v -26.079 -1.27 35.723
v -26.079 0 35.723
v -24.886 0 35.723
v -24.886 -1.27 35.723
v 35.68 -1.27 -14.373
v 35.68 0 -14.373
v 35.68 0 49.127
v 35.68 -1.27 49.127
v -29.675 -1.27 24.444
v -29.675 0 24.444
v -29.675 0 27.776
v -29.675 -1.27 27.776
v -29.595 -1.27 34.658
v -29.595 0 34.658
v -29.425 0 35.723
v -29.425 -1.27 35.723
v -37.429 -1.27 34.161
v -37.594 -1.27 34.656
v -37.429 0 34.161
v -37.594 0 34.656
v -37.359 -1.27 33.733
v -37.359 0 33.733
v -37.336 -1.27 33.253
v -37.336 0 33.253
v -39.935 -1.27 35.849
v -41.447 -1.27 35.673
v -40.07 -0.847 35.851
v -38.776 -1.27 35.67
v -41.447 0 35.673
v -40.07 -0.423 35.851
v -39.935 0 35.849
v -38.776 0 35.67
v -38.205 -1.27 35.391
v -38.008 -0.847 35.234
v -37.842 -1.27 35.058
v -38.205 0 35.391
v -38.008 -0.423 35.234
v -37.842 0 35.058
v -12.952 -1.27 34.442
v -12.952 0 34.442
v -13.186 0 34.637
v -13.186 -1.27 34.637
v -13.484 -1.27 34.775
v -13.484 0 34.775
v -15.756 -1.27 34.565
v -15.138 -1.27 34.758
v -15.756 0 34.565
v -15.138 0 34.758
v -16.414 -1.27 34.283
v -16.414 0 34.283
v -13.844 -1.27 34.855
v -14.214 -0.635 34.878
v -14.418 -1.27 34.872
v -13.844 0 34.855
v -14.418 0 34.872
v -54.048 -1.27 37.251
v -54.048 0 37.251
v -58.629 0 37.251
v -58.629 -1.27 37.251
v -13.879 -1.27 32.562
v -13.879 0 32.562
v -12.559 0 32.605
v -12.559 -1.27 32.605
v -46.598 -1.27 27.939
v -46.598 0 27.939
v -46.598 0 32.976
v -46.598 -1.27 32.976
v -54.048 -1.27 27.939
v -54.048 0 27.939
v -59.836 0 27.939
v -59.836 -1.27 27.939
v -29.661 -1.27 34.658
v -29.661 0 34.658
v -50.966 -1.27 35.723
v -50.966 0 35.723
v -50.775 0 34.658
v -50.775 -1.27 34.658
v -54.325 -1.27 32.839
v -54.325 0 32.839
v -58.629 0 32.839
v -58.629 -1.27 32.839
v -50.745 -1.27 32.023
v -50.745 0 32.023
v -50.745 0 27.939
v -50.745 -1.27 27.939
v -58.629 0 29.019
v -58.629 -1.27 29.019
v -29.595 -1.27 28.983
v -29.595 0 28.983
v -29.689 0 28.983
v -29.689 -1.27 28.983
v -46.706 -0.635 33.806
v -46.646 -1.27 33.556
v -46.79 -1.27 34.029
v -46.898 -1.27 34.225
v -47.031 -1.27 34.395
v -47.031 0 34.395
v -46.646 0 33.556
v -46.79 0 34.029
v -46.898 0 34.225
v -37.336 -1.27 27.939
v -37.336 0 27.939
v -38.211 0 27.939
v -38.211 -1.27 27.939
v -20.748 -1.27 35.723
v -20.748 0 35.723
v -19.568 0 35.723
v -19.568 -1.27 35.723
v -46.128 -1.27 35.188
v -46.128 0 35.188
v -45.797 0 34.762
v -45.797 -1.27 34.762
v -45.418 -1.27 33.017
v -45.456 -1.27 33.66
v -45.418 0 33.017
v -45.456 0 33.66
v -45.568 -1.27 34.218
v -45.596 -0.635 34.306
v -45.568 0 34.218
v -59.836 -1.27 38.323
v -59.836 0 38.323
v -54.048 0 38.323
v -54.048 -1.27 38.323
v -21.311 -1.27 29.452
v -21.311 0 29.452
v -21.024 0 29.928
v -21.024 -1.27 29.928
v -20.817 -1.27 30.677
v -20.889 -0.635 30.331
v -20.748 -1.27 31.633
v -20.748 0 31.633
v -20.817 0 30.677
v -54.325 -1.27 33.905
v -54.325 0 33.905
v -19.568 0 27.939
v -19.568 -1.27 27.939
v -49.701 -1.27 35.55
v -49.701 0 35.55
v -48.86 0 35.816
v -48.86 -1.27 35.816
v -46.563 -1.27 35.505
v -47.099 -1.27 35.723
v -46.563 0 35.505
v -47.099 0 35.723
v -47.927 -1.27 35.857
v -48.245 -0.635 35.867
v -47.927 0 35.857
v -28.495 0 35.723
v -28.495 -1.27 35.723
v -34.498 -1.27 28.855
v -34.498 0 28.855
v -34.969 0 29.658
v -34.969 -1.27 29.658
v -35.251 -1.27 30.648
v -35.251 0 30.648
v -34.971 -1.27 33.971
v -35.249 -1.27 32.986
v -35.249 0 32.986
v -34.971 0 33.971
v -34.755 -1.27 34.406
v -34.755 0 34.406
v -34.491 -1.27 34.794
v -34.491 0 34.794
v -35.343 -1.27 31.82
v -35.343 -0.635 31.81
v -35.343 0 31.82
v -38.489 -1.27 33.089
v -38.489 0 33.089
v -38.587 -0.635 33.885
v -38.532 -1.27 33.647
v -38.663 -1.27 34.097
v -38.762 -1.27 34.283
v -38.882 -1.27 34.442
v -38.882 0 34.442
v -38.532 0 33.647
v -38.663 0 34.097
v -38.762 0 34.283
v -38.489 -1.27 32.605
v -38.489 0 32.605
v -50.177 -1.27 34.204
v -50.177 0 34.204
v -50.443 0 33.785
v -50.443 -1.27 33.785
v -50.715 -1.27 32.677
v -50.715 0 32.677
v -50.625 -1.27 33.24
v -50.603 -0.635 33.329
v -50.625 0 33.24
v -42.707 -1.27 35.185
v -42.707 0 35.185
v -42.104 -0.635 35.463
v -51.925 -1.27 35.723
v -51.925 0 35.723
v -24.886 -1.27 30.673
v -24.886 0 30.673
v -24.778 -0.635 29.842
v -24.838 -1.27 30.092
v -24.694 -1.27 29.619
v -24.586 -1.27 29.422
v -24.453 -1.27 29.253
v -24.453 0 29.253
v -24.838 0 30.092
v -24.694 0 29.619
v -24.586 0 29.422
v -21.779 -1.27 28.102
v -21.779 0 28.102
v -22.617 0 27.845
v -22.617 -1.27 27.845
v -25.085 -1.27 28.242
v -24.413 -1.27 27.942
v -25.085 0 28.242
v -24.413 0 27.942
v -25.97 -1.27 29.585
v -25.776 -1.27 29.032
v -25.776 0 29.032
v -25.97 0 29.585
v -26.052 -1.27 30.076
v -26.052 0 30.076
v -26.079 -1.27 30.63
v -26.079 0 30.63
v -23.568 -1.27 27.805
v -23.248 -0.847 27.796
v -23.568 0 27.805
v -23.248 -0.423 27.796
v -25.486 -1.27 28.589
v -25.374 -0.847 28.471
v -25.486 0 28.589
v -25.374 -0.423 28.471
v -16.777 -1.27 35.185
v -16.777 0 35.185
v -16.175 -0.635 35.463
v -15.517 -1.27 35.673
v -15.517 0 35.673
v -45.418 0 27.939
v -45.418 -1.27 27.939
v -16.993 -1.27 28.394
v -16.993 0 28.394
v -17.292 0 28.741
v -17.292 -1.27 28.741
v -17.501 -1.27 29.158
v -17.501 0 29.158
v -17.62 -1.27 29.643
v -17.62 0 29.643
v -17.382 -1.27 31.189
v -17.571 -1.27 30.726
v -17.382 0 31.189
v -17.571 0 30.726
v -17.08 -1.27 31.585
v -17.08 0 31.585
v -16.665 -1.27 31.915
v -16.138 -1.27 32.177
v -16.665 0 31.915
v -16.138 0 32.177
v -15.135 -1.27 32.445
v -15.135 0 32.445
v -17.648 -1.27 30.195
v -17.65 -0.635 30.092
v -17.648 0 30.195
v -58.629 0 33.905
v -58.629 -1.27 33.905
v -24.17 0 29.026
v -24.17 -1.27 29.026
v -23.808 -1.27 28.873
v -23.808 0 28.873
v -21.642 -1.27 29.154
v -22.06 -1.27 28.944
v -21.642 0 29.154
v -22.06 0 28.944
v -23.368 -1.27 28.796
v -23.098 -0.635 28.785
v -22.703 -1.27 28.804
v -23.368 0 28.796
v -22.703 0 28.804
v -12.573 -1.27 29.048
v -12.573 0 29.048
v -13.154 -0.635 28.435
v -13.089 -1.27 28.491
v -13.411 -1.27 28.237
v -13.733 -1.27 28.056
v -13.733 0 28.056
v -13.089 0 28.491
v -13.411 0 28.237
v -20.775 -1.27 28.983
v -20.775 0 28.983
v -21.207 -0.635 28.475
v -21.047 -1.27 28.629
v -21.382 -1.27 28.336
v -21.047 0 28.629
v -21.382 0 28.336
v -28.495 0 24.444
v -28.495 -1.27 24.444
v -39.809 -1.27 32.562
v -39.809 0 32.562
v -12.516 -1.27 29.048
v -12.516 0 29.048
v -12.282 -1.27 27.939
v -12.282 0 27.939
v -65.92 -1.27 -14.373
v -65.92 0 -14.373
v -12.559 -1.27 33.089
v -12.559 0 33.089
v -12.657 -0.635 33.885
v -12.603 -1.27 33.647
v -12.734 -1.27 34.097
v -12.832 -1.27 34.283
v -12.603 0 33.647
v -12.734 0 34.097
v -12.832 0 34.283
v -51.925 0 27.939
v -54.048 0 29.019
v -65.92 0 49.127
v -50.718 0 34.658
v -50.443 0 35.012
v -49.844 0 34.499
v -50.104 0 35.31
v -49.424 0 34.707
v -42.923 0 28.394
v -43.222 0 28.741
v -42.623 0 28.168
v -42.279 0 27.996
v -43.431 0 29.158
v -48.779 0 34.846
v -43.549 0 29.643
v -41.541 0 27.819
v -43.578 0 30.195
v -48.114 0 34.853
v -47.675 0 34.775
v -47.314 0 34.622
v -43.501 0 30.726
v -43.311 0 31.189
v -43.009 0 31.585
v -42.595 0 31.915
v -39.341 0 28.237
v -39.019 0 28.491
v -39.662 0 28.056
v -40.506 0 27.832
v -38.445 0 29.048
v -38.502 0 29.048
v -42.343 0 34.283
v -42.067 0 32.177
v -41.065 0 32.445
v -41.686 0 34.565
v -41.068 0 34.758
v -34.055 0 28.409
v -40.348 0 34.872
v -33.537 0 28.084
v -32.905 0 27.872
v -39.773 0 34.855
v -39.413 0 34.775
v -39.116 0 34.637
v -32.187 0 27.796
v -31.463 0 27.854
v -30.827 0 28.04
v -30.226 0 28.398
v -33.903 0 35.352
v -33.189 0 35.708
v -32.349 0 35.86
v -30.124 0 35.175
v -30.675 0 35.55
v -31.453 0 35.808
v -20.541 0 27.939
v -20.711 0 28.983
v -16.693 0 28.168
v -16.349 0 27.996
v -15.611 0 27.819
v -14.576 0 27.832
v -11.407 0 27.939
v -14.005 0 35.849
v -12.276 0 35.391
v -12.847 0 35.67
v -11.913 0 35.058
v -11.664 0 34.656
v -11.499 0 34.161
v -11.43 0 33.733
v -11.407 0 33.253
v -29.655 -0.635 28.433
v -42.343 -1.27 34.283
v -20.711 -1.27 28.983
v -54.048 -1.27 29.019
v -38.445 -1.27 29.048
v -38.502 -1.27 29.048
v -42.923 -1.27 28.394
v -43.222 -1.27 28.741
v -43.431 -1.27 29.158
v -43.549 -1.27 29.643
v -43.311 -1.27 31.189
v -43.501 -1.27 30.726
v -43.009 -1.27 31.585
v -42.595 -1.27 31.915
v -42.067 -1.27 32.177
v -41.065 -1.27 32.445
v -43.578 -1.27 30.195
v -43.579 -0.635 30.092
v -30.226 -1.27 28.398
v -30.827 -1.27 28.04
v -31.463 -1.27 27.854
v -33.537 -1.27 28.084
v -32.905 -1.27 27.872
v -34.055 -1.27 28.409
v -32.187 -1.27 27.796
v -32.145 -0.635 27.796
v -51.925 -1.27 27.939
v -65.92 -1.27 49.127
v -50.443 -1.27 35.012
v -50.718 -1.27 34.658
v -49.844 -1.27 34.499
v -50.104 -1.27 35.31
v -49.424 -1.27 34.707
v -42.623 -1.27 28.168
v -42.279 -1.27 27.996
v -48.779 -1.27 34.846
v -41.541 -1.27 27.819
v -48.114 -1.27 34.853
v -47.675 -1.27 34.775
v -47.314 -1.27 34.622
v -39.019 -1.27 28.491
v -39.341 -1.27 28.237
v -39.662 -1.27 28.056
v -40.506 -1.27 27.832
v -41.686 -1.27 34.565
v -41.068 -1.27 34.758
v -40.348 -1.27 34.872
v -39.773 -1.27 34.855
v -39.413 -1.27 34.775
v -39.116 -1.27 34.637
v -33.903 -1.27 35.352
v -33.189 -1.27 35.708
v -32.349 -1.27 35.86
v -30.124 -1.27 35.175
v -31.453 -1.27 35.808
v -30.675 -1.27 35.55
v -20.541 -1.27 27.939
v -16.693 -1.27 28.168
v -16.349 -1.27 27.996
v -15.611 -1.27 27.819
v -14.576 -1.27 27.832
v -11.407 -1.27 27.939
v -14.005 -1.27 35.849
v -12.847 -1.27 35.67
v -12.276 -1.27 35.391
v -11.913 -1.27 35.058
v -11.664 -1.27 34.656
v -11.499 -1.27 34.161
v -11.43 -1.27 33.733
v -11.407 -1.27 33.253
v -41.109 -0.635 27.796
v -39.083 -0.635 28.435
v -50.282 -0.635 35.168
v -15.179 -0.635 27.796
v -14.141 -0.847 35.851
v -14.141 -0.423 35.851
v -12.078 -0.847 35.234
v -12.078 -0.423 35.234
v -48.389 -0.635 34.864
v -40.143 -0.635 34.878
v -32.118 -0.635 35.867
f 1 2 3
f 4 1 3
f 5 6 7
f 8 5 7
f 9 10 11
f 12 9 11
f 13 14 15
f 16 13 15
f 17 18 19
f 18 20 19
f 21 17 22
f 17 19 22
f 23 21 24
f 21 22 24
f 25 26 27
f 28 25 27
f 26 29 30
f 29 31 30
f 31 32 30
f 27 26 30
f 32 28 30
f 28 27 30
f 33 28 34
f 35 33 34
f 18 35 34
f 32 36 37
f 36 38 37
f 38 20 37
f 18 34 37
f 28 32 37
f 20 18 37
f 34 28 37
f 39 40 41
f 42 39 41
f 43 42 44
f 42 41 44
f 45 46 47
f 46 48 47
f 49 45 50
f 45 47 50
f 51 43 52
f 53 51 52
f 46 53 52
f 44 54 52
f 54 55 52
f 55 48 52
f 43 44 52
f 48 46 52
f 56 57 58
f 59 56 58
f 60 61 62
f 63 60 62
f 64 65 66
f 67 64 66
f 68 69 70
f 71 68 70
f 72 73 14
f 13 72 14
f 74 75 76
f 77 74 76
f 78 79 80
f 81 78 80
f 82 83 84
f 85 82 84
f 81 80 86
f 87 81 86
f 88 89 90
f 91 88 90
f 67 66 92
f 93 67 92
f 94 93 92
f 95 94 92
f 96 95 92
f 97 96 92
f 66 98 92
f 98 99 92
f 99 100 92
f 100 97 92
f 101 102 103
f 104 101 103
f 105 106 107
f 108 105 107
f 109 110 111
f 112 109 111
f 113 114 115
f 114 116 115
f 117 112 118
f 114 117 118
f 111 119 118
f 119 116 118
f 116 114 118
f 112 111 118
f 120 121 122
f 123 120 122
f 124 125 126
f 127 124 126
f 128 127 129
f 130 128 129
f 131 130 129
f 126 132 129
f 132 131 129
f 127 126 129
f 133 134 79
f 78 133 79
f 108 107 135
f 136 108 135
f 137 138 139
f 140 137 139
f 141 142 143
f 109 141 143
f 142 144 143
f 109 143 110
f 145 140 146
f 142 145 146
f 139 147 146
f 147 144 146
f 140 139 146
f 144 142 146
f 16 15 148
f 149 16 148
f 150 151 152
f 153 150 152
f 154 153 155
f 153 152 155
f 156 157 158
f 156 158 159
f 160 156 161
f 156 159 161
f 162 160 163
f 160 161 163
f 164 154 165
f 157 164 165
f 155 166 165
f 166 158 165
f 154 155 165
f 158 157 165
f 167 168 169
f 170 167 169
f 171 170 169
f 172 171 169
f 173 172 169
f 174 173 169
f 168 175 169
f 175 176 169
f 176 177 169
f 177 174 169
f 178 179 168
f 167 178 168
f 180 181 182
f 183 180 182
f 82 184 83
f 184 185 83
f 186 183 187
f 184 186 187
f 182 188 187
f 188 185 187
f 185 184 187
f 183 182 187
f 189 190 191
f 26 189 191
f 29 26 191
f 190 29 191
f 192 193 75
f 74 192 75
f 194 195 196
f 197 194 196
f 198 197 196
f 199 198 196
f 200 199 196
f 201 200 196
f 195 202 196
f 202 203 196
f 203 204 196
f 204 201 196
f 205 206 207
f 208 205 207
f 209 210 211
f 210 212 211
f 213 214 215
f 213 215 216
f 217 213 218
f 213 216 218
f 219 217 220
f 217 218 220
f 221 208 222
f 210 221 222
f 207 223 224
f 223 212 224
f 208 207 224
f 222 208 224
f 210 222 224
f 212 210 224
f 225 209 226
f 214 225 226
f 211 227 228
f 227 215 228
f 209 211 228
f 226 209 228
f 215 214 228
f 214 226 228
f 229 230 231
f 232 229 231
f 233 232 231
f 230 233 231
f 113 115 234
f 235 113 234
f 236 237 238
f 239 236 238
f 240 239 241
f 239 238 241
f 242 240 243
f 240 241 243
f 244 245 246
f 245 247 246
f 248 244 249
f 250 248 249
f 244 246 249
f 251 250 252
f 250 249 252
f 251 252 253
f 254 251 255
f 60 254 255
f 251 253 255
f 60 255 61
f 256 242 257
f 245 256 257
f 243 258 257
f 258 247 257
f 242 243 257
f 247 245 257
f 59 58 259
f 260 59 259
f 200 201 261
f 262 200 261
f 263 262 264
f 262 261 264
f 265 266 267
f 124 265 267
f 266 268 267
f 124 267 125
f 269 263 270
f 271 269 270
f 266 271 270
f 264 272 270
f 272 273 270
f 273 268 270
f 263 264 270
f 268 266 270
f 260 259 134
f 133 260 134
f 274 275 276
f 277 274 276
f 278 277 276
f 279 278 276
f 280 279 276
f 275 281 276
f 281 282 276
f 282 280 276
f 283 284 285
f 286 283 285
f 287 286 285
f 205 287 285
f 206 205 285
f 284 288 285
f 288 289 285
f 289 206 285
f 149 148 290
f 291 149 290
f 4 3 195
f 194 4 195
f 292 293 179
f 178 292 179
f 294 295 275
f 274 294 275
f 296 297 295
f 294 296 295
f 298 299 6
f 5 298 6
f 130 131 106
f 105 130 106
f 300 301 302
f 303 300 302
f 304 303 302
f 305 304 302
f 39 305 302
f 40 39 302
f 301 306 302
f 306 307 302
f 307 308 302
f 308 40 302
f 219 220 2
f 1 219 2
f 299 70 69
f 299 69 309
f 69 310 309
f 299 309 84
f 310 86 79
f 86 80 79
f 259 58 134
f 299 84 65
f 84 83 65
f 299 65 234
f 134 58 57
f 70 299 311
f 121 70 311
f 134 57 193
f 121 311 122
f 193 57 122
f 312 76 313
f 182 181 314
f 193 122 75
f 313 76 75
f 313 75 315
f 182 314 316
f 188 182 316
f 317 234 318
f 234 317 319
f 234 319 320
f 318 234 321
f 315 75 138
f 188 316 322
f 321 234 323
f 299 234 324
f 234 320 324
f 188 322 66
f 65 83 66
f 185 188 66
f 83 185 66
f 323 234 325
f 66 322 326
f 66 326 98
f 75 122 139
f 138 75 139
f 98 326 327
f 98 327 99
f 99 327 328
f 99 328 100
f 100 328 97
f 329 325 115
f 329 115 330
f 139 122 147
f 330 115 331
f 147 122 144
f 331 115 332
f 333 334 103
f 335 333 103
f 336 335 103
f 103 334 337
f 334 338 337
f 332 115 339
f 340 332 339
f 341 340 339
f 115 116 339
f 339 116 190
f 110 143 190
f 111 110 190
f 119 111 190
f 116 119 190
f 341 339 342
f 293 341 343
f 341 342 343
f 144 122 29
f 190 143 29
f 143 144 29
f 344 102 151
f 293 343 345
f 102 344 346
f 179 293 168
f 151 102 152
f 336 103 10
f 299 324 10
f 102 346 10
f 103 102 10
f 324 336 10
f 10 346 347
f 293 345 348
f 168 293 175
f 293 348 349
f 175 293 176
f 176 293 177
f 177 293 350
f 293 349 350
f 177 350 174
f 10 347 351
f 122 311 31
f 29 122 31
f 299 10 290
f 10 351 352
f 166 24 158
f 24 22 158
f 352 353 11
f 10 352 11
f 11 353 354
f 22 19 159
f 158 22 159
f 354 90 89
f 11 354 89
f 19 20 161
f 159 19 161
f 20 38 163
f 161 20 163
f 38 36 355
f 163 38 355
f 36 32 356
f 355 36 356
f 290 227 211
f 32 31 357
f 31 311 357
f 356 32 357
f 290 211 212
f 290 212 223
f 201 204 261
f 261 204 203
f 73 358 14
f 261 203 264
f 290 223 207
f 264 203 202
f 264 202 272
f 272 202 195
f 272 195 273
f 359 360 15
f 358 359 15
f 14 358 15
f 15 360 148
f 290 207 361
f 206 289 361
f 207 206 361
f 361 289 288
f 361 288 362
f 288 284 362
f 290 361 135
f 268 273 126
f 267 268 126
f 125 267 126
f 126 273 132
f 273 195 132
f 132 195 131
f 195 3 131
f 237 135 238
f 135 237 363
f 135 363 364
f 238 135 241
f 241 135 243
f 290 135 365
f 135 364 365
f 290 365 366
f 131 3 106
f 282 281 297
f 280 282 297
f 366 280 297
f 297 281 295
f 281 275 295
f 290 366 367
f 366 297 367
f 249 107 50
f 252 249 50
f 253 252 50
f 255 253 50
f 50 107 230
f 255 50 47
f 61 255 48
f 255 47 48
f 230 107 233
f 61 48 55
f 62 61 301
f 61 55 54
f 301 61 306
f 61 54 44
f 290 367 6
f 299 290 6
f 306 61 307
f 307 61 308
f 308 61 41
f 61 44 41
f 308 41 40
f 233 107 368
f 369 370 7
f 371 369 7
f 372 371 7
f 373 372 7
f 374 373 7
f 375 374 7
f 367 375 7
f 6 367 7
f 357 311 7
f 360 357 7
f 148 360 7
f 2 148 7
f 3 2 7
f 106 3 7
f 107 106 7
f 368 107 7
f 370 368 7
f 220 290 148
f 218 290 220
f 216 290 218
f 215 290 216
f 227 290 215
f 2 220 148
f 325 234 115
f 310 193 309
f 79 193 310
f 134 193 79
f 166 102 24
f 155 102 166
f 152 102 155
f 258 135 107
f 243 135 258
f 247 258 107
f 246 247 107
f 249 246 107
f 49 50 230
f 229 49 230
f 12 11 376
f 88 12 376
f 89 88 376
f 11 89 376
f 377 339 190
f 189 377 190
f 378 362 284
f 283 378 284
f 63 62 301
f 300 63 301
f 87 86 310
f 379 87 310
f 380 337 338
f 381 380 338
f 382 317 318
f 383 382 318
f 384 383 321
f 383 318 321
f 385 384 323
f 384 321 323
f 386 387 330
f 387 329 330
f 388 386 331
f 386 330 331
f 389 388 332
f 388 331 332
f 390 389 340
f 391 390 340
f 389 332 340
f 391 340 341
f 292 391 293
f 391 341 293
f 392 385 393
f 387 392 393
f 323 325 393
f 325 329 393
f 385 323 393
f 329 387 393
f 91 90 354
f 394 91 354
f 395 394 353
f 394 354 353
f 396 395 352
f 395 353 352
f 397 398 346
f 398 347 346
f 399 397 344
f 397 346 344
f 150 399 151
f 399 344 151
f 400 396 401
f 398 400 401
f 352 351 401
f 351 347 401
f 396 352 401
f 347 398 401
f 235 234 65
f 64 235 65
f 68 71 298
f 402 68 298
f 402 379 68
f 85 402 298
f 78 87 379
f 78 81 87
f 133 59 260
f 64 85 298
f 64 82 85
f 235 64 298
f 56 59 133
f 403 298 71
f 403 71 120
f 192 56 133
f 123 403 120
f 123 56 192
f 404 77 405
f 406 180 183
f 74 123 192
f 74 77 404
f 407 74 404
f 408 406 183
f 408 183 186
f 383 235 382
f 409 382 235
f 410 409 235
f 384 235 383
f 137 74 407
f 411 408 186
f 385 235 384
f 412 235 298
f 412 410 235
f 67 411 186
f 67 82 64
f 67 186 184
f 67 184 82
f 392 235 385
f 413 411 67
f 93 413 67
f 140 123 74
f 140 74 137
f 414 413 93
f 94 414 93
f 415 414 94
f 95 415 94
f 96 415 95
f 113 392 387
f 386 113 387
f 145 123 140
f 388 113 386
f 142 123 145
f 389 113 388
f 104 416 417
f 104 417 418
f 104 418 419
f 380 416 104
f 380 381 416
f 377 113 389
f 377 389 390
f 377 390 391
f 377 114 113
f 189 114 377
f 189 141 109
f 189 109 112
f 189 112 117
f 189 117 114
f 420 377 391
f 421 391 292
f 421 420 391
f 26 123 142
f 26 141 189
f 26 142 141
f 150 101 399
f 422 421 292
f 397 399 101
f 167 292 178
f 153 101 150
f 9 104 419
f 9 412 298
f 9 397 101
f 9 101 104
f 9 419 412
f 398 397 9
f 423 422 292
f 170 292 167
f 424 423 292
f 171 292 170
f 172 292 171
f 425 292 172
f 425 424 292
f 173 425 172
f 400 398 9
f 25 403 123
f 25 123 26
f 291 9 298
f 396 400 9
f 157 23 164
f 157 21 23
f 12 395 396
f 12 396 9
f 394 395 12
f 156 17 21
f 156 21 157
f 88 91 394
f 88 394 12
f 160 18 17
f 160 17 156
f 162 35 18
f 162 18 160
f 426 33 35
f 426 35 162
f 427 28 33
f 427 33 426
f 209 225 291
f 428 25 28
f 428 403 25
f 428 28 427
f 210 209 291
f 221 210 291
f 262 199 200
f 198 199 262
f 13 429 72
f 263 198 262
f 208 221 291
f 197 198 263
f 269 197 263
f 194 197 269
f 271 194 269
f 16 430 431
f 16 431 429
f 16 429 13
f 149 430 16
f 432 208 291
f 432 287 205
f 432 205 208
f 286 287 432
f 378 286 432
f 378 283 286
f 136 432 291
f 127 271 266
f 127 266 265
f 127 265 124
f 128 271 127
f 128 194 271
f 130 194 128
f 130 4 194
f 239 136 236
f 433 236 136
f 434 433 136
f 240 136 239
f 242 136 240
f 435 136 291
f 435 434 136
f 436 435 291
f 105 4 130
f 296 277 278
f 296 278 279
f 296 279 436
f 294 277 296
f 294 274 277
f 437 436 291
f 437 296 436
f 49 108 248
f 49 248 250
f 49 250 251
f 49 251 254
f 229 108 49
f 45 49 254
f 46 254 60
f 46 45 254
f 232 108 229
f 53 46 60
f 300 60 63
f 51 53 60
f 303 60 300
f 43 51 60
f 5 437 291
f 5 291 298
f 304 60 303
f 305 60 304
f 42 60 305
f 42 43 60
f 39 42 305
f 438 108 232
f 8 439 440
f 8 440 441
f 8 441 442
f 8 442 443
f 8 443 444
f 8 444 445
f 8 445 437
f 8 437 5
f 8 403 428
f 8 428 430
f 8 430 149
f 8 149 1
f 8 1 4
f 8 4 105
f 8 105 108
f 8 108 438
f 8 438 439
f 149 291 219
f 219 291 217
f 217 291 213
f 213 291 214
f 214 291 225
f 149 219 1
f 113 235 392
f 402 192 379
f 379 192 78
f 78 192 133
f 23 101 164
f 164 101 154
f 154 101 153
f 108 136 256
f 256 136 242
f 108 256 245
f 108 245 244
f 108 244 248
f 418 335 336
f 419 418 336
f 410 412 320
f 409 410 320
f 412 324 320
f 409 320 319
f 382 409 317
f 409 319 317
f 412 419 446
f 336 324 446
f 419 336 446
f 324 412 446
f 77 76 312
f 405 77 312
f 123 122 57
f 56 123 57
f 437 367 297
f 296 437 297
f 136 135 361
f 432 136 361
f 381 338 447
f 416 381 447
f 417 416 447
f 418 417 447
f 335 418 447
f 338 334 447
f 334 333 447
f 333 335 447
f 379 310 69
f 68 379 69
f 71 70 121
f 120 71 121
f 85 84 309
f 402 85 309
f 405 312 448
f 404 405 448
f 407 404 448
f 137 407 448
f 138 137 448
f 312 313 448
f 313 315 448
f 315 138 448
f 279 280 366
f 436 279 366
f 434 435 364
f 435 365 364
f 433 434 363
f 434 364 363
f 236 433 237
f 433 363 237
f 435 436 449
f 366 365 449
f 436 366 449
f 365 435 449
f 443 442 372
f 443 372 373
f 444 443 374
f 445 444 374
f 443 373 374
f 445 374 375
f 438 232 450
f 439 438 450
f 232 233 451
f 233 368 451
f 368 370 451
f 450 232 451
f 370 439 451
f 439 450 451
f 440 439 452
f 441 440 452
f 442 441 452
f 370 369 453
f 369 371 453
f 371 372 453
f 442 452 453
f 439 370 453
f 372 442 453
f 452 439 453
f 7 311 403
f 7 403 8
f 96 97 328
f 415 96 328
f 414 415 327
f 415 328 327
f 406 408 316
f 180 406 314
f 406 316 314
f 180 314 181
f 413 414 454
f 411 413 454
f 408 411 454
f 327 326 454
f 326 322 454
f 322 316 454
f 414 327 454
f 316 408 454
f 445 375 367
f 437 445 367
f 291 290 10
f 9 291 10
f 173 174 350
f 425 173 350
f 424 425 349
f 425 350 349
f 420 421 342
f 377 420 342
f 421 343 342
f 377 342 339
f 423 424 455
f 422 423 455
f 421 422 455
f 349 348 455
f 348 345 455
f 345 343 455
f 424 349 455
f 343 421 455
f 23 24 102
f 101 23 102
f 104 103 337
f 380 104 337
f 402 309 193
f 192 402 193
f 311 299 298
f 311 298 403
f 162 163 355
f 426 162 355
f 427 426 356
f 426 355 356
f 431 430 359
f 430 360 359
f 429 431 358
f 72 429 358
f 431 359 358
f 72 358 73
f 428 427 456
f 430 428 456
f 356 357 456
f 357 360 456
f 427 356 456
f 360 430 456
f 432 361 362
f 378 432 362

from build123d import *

# Parameters (mm, degrees)
F0_W     = 101.6
F0_H     = 63.5
F1_DEPTH = 1.27


with BuildPart() as f1:
    # F0 (on Front) → F1 (new body)
    with BuildSketch(Plane.XZ):
        with Locations((-15.1200704277, 17.3774155871)):
            Rectangle(F0_W, F0_H)
        Polygon((-54.0476633337, 29.0188750451), (-54.0476633337, 27.9393295906), (-59.8362996974, 27.9393295906), (-59.8362996974, 38.3234204997), (-54.0476633337, 38.3234204997), (-54.0476633337, 37.2506932269), (-58.6294815156, 37.2506932269), (-58.6294815156, 33.9052386815), (-54.324936061, 33.9052386815), (-54.324936061, 32.8393295906), (-58.6294815156, 32.8393295906), (-58.6294815156, 29.0188750451), align=None, mode=Mode.SUBTRACT)
        with BuildLine():
            Line((-45.4181178792, 27.9393295906), (-46.5976633337, 27.9393295906))
            Line((-46.5976633337, 27.9393295906), (-46.5976633337, 32.9756932269))
            add(Edge.make_bspline(
                [(-46.5976633337, 32.9756932269), (-46.5976633337, 33.9256932269), (-47.0306178792, 34.3950114088)],
                knots=[0, 0, 0, 1, 1, 1], degree=2))
            add(Edge.make_bspline(
                [(-47.0306178792, 34.3950114088), (-47.4635724247, 34.8643295906), (-48.3885724247, 34.8643295906)],
                knots=[0, 0, 0, 1, 1, 1], degree=2))
            add(Edge.make_bspline(
                [(-48.3885724247, 34.8643295906), (-49.6090269701, 34.8643295906), (-50.1772087883, 34.2041023179)],
                knots=[0, 0, 0, 1, 1, 1], degree=2))
            add(Edge.make_bspline(
                [(-50.1772087883, 34.2041023179), (-50.7453906065, 33.5438750451), (-50.7453906065, 32.0234204997)],
                knots=[0, 0, 0, 1, 1, 1], degree=2))
            Line((-50.7453906065, 32.0234204997), (-50.7453906065, 27.9393295906))
            Line((-50.7453906065, 27.9393295906), (-51.924936061, 27.9393295906))
            Line((-51.924936061, 27.9393295906), (-51.924936061, 35.7234204997))
            Line((-51.924936061, 35.7234204997), (-50.9658451519, 35.7234204997))
            Line((-50.9658451519, 35.7234204997), (-50.774936061, 34.6575114088))
            Line((-50.774936061, 34.6575114088), (-50.7181178792, 34.6575114088))
            add(Edge.make_bspline(
                [(-50.7181178792, 34.6575114088), (-50.3544815156, 35.2325114088), (-49.7010724247, 35.5495568633)],
                knots=[0, 0, 0, 1, 1, 1], degree=2))
            add(Edge.make_bspline(
                [(-49.7010724247, 35.5495568633), (-49.0476633337, 35.8666023179), (-48.2453906065, 35.8666023179)],
                knots=[0, 0, 0, 1, 1, 1], degree=2))
            add(Edge.make_bspline(
                [(-48.2453906065, 35.8666023179), (-46.8385724247, 35.8666023179), (-46.1283451519, 35.1881932269)],
                knots=[0, 0, 0, 1, 1, 1], degree=2))
            add(Edge.make_bspline(
                [(-46.1283451519, 35.1881932269), (-45.4181178792, 34.509784136), (-45.4181178792, 33.0166023179)],
                knots=[0, 0, 0, 1, 1, 1], degree=2))
            Line((-45.4181178792, 33.0166023179), (-45.4181178792, 27.9393295906))
        make_face(mode=Mode.SUBTRACT)
        with BuildLine():
            Line((-37.3362996974, 27.9393295906), (-38.2112996974, 27.9393295906))
            Line((-38.2112996974, 27.9393295906), (-38.4453906065, 29.0484204997))
            Line((-38.4453906065, 29.0484204997), (-38.5022087883, 29.0484204997))
            add(Edge.make_bspline(
                [(-38.5022087883, 29.0484204997), (-39.0840269701, 28.3166023179), (-39.662436061, 28.0563750451)],
                knots=[0, 0, 0, 1, 1, 1], degree=2))
            add(Edge.make_bspline(
                [(-39.662436061, 28.0563750451), (-40.2408451519, 27.7961477724), (-41.1090269701, 27.7961477724)],
                knots=[0, 0, 0, 1, 1, 1], degree=2))
            add(Edge.make_bspline(
                [(-41.1090269701, 27.7961477724), (-42.2658451519, 27.7961477724), (-42.9226633337, 28.3938750451)],
                knots=[0, 0, 0, 1, 1, 1], degree=2))
            add(Edge.make_bspline(
                [(-42.9226633337, 28.3938750451), (-43.5794815156, 28.9916023179), (-43.5794815156, 30.0916023179)],
                knots=[0, 0, 0, 1, 1, 1], degree=2))
            add(Edge.make_bspline(
                [(-43.5794815156, 30.0916023179), (-43.5794815156, 32.4484204997), (-39.8090269701, 32.5620568633)],
                knots=[0, 0, 0, 1, 1, 1], degree=2))
            Line((-39.8090269701, 32.5620568633), (-38.4885724247, 32.6052386815))
            Line((-38.4885724247, 32.6052386815), (-38.4885724247, 33.0893295906))
            add(Edge.make_bspline(
                [(-38.4885724247, 33.0893295906), (-38.4885724247, 34.0052386815), (-38.8817542428, 34.4416023179)],
                knots=[0, 0, 0, 1, 1, 1], degree=2))
            add(Edge.make_bspline(
                [(-38.8817542428, 34.4416023179), (-39.274936061, 34.8779659542), (-40.1431178792, 34.8779659542)],
                knots=[0, 0, 0, 1, 1, 1], degree=2))
            add(Edge.make_bspline(
                [(-40.1431178792, 34.8779659542), (-41.1158451519, 34.8779659542), (-42.3431178792, 34.2825114088)],
                knots=[0, 0, 0, 1, 1, 1], degree=2))
            Line((-42.3431178792, 34.2825114088), (-42.7067542428, 35.184784136))
            add(Edge.make_bspline(
                [(-42.7067542428, 35.184784136), (-42.1317542428, 35.4961477724), (-41.4465269701, 35.6734204997)],
                knots=[0, 0, 0, 1, 1, 1], degree=2))
            add(Edge.make_bspline(
                [(-41.4465269701, 35.6734204997), (-40.7612996974, 35.8506932269), (-40.0703906065, 35.8506932269)],
                knots=[0, 0, 0, 1, 1, 1], degree=2))
            add(Edge.make_bspline(
                [(-40.0703906065, 35.8506932269), (-38.6794815156, 35.8506932269), (-38.0078906065, 35.2336477724)],
                knots=[0, 0, 0, 1, 1, 1], degree=2))
            add(Edge.make_bspline(
                [(-38.0078906065, 35.2336477724), (-37.3362996974, 34.6166023179), (-37.3362996974, 33.2529659542)],
                knots=[0, 0, 0, 1, 1, 1], degree=2))
            Line((-37.3362996974, 33.2529659542), (-37.3362996974, 27.9393295906))
        make_face(mode=Mode.SUBTRACT)
        with BuildLine():
            add(Edge.make_bspline(
                [(-29.6885724247, 28.9825114088), (-30.5044815156, 27.7961477724), (-32.1453906065, 27.7961477724)],
                knots=[0, 0, 0, 1, 1, 1], degree=2))
            add(Edge.make_bspline(
                [(-32.1453906065, 27.7961477724), (-33.6522087883, 27.7961477724), (-34.4976633337, 28.8552386815)],
                knots=[0, 0, 0, 1, 1, 1], degree=2))
            add(Edge.make_bspline(
                [(-34.4976633337, 28.8552386815), (-35.3431178792, 29.9143295906), (-35.3431178792, 31.809784136)],
                knots=[0, 0, 0, 1, 1, 1], degree=2))
            add(Edge.make_bspline(
                [(-35.3431178792, 31.809784136), (-35.3431178792, 33.7211477724), (-34.4908451519, 34.7938750451)],
                knots=[0, 0, 0, 1, 1, 1], degree=2))
            add(Edge.make_bspline(
                [(-34.4908451519, 34.7938750451), (-33.6385724247, 35.8666023179), (-32.1181178792, 35.8666023179)],
                knots=[0, 0, 0, 1, 1, 1], degree=2))
            add(Edge.make_bspline(
                [(-32.1181178792, 35.8666023179), (-30.5203906065, 35.8666023179), (-29.6612996974, 34.6575114088)],
                knots=[0, 0, 0, 1, 1, 1], degree=2))
            Line((-29.6612996974, 34.6575114088), (-29.5953906065, 34.6575114088))
            Line((-29.5953906065, 34.6575114088), (-29.424936061, 35.7234204997))
            Line((-29.424936061, 35.7234204997), (-28.4953906065, 35.7234204997))
            Line((-28.4953906065, 35.7234204997), (-28.4953906065, 24.4438750451))
            Line((-28.4953906065, 24.4438750451), (-29.674936061, 24.4438750451))
            Line((-29.674936061, 24.4438750451), (-29.674936061, 27.7756932269))
            add(Edge.make_bspline(
                [(-29.674936061, 27.7756932269), (-29.674936061, 28.4870568633), (-29.5953906065, 28.9825114088)],
                knots=[0, 0, 0, 1, 1, 1], degree=2))
            Line((-29.5953906065, 28.9825114088), (-29.6885724247, 28.9825114088))
        make_face(mode=Mode.SUBTRACT)
        with BuildLine():
            Line((-26.0794815156, 35.7234204997), (-24.8862996974, 35.7234204997))
            Line((-24.8862996974, 35.7234204997), (-24.8862996974, 30.6734204997))
            add(Edge.make_bspline(
                [(-24.8862996974, 30.6734204997), (-24.8862996974, 29.7211477724), (-24.4533451519, 29.2529659542)],
                knots=[0, 0, 0, 1, 1, 1], degree=2))
            add(Edge.make_bspline(
                [(-24.4533451519, 29.2529659542), (-24.0203906065, 28.784784136), (-23.0976633337, 28.784784136)],
                knots=[0, 0, 0, 1, 1, 1], degree=2))
            add(Edge.make_bspline(
                [(-23.0976633337, 28.784784136), (-21.874936061, 28.784784136), (-21.3112996974, 29.4518295906)],
                knots=[0, 0, 0, 1, 1, 1], degree=2))
            add(Edge.make_bspline(
                [(-21.3112996974, 29.4518295906), (-20.7476633337, 30.1188750451), (-20.7476633337, 31.6325114088)],
                knots=[0, 0, 0, 1, 1, 1], degree=2))
            Line((-20.7476633337, 31.6325114088), (-20.7476633337, 35.7234204997))
            Line((-20.7476633337, 35.7234204997), (-19.5681178792, 35.7234204997))
            Line((-19.5681178792, 35.7234204997), (-19.5681178792, 27.9393295906))
            Line((-19.5681178792, 27.9393295906), (-20.5408451519, 27.9393295906))
            Line((-20.5408451519, 27.9393295906), (-20.7112996974, 28.9825114088))
            Line((-20.7112996974, 28.9825114088), (-20.774936061, 28.9825114088))
            add(Edge.make_bspline(
                [(-20.774936061, 28.9825114088), (-21.1362996974, 28.4075114088), (-21.7794815156, 28.1018295906)],
                knots=[0, 0, 0, 1, 1, 1], degree=2))
            add(Edge.make_bspline(
                [(-21.7794815156, 28.1018295906), (-22.4226633337, 27.7961477724), (-23.2476633337, 27.7961477724)],
                knots=[0, 0, 0, 1, 1, 1], degree=2))
            add(Edge.make_bspline(
                [(-23.2476633337, 27.7961477724), (-24.6681178792, 27.7961477724), (-25.3737996974, 28.4711477724)],
                knots=[0, 0, 0, 1, 1, 1], degree=2))
            add(Edge.make_bspline(
                [(-25.3737996974, 28.4711477724), (-26.0794815156, 29.1461477724), (-26.0794815156, 30.6302386815)],
                knots=[0, 0, 0, 1, 1, 1], degree=2))
            Line((-26.0794815156, 30.6302386815), (-26.0794815156, 35.7234204997))
        make_face(mode=Mode.SUBTRACT)
        with BuildLine():
            Line((-11.4067542428, 27.9393295906), (-12.2817542428, 27.9393295906))
            Line((-12.2817542428, 27.9393295906), (-12.5158451519, 29.0484204997))
            Line((-12.5158451519, 29.0484204997), (-12.5726633337, 29.0484204997))
            add(Edge.make_bspline(
                [(-12.5726633337, 29.0484204997), (-13.1544815156, 28.3166023179), (-13.7328906065, 28.0563750451)],
                knots=[0, 0, 0, 1, 1, 1], degree=2))
            add(Edge.make_bspline(
                [(-13.7328906065, 28.0563750451), (-14.3112996974, 27.7961477724), (-15.1794815156, 27.7961477724)],
                knots=[0, 0, 0, 1, 1, 1], degree=2))
            add(Edge.make_bspline(
                [(-15.1794815156, 27.7961477724), (-16.3362996974, 27.7961477724), (-16.9931178792, 28.3938750451)],
                knots=[0, 0, 0, 1, 1, 1], degree=2))
            add(Edge.make_bspline(
                [(-16.9931178792, 28.3938750451), (-17.649936061, 28.9916023179), (-17.649936061, 30.0916023179)],
                knots=[0, 0, 0, 1, 1, 1], degree=2))
            add(Edge.make_bspline(
                [(-17.649936061, 30.0916023179), (-17.649936061, 32.4484204997), (-13.8794815156, 32.5620568633)],
                knots=[0, 0, 0, 1, 1, 1], degree=2))
            Line((-13.8794815156, 32.5620568633), (-12.5590269701, 32.6052386815))
            Line((-12.5590269701, 32.6052386815), (-12.5590269701, 33.0893295906))
            add(Edge.make_bspline(
                [(-12.5590269701, 33.0893295906), (-12.5590269701, 34.0052386815), (-12.9522087883, 34.4416023179)],
                knots=[0, 0, 0, 1, 1, 1], degree=2))
            add(Edge.make_bspline(
                [(-12.9522087883, 34.4416023179), (-13.3453906065, 34.8779659542), (-14.2135724247, 34.8779659542)],
                knots=[0, 0, 0, 1, 1, 1], degree=2))
            add(Edge.make_bspline(
                [(-14.2135724247, 34.8779659542), (-15.1862996974, 34.8779659542), (-16.4135724247, 34.2825114088)],
                knots=[0, 0, 0, 1, 1, 1], degree=2))
            Line((-16.4135724247, 34.2825114088), (-16.7772087883, 35.184784136))
            add(Edge.make_bspline(
                [(-16.7772087883, 35.184784136), (-16.2022087883, 35.4961477724), (-15.5169815156, 35.6734204997)],
                knots=[0, 0, 0, 1, 1, 1], degree=2))
            add(Edge.make_bspline(
                [(-15.5169815156, 35.6734204997), (-14.8317542428, 35.8506932269), (-14.1408451519, 35.8506932269)],
                knots=[0, 0, 0, 1, 1, 1], degree=2))
            add(Edge.make_bspline(
                [(-14.1408451519, 35.8506932269), (-12.749936061, 35.8506932269), (-12.0783451519, 35.2336477724)],
                knots=[0, 0, 0, 1, 1, 1], degree=2))
            add(Edge.make_bspline(
                [(-12.0783451519, 35.2336477724), (-11.4067542428, 34.6166023179), (-11.4067542428, 33.2529659542)],
                knots=[0, 0, 0, 1, 1, 1], degree=2))
            Line((-11.4067542428, 33.2529659542), (-11.4067542428, 27.9393295906))
        make_face(mode=Mode.SUBTRACT)
    extrude(amount=F1_DEPTH)


solid = f1.part
